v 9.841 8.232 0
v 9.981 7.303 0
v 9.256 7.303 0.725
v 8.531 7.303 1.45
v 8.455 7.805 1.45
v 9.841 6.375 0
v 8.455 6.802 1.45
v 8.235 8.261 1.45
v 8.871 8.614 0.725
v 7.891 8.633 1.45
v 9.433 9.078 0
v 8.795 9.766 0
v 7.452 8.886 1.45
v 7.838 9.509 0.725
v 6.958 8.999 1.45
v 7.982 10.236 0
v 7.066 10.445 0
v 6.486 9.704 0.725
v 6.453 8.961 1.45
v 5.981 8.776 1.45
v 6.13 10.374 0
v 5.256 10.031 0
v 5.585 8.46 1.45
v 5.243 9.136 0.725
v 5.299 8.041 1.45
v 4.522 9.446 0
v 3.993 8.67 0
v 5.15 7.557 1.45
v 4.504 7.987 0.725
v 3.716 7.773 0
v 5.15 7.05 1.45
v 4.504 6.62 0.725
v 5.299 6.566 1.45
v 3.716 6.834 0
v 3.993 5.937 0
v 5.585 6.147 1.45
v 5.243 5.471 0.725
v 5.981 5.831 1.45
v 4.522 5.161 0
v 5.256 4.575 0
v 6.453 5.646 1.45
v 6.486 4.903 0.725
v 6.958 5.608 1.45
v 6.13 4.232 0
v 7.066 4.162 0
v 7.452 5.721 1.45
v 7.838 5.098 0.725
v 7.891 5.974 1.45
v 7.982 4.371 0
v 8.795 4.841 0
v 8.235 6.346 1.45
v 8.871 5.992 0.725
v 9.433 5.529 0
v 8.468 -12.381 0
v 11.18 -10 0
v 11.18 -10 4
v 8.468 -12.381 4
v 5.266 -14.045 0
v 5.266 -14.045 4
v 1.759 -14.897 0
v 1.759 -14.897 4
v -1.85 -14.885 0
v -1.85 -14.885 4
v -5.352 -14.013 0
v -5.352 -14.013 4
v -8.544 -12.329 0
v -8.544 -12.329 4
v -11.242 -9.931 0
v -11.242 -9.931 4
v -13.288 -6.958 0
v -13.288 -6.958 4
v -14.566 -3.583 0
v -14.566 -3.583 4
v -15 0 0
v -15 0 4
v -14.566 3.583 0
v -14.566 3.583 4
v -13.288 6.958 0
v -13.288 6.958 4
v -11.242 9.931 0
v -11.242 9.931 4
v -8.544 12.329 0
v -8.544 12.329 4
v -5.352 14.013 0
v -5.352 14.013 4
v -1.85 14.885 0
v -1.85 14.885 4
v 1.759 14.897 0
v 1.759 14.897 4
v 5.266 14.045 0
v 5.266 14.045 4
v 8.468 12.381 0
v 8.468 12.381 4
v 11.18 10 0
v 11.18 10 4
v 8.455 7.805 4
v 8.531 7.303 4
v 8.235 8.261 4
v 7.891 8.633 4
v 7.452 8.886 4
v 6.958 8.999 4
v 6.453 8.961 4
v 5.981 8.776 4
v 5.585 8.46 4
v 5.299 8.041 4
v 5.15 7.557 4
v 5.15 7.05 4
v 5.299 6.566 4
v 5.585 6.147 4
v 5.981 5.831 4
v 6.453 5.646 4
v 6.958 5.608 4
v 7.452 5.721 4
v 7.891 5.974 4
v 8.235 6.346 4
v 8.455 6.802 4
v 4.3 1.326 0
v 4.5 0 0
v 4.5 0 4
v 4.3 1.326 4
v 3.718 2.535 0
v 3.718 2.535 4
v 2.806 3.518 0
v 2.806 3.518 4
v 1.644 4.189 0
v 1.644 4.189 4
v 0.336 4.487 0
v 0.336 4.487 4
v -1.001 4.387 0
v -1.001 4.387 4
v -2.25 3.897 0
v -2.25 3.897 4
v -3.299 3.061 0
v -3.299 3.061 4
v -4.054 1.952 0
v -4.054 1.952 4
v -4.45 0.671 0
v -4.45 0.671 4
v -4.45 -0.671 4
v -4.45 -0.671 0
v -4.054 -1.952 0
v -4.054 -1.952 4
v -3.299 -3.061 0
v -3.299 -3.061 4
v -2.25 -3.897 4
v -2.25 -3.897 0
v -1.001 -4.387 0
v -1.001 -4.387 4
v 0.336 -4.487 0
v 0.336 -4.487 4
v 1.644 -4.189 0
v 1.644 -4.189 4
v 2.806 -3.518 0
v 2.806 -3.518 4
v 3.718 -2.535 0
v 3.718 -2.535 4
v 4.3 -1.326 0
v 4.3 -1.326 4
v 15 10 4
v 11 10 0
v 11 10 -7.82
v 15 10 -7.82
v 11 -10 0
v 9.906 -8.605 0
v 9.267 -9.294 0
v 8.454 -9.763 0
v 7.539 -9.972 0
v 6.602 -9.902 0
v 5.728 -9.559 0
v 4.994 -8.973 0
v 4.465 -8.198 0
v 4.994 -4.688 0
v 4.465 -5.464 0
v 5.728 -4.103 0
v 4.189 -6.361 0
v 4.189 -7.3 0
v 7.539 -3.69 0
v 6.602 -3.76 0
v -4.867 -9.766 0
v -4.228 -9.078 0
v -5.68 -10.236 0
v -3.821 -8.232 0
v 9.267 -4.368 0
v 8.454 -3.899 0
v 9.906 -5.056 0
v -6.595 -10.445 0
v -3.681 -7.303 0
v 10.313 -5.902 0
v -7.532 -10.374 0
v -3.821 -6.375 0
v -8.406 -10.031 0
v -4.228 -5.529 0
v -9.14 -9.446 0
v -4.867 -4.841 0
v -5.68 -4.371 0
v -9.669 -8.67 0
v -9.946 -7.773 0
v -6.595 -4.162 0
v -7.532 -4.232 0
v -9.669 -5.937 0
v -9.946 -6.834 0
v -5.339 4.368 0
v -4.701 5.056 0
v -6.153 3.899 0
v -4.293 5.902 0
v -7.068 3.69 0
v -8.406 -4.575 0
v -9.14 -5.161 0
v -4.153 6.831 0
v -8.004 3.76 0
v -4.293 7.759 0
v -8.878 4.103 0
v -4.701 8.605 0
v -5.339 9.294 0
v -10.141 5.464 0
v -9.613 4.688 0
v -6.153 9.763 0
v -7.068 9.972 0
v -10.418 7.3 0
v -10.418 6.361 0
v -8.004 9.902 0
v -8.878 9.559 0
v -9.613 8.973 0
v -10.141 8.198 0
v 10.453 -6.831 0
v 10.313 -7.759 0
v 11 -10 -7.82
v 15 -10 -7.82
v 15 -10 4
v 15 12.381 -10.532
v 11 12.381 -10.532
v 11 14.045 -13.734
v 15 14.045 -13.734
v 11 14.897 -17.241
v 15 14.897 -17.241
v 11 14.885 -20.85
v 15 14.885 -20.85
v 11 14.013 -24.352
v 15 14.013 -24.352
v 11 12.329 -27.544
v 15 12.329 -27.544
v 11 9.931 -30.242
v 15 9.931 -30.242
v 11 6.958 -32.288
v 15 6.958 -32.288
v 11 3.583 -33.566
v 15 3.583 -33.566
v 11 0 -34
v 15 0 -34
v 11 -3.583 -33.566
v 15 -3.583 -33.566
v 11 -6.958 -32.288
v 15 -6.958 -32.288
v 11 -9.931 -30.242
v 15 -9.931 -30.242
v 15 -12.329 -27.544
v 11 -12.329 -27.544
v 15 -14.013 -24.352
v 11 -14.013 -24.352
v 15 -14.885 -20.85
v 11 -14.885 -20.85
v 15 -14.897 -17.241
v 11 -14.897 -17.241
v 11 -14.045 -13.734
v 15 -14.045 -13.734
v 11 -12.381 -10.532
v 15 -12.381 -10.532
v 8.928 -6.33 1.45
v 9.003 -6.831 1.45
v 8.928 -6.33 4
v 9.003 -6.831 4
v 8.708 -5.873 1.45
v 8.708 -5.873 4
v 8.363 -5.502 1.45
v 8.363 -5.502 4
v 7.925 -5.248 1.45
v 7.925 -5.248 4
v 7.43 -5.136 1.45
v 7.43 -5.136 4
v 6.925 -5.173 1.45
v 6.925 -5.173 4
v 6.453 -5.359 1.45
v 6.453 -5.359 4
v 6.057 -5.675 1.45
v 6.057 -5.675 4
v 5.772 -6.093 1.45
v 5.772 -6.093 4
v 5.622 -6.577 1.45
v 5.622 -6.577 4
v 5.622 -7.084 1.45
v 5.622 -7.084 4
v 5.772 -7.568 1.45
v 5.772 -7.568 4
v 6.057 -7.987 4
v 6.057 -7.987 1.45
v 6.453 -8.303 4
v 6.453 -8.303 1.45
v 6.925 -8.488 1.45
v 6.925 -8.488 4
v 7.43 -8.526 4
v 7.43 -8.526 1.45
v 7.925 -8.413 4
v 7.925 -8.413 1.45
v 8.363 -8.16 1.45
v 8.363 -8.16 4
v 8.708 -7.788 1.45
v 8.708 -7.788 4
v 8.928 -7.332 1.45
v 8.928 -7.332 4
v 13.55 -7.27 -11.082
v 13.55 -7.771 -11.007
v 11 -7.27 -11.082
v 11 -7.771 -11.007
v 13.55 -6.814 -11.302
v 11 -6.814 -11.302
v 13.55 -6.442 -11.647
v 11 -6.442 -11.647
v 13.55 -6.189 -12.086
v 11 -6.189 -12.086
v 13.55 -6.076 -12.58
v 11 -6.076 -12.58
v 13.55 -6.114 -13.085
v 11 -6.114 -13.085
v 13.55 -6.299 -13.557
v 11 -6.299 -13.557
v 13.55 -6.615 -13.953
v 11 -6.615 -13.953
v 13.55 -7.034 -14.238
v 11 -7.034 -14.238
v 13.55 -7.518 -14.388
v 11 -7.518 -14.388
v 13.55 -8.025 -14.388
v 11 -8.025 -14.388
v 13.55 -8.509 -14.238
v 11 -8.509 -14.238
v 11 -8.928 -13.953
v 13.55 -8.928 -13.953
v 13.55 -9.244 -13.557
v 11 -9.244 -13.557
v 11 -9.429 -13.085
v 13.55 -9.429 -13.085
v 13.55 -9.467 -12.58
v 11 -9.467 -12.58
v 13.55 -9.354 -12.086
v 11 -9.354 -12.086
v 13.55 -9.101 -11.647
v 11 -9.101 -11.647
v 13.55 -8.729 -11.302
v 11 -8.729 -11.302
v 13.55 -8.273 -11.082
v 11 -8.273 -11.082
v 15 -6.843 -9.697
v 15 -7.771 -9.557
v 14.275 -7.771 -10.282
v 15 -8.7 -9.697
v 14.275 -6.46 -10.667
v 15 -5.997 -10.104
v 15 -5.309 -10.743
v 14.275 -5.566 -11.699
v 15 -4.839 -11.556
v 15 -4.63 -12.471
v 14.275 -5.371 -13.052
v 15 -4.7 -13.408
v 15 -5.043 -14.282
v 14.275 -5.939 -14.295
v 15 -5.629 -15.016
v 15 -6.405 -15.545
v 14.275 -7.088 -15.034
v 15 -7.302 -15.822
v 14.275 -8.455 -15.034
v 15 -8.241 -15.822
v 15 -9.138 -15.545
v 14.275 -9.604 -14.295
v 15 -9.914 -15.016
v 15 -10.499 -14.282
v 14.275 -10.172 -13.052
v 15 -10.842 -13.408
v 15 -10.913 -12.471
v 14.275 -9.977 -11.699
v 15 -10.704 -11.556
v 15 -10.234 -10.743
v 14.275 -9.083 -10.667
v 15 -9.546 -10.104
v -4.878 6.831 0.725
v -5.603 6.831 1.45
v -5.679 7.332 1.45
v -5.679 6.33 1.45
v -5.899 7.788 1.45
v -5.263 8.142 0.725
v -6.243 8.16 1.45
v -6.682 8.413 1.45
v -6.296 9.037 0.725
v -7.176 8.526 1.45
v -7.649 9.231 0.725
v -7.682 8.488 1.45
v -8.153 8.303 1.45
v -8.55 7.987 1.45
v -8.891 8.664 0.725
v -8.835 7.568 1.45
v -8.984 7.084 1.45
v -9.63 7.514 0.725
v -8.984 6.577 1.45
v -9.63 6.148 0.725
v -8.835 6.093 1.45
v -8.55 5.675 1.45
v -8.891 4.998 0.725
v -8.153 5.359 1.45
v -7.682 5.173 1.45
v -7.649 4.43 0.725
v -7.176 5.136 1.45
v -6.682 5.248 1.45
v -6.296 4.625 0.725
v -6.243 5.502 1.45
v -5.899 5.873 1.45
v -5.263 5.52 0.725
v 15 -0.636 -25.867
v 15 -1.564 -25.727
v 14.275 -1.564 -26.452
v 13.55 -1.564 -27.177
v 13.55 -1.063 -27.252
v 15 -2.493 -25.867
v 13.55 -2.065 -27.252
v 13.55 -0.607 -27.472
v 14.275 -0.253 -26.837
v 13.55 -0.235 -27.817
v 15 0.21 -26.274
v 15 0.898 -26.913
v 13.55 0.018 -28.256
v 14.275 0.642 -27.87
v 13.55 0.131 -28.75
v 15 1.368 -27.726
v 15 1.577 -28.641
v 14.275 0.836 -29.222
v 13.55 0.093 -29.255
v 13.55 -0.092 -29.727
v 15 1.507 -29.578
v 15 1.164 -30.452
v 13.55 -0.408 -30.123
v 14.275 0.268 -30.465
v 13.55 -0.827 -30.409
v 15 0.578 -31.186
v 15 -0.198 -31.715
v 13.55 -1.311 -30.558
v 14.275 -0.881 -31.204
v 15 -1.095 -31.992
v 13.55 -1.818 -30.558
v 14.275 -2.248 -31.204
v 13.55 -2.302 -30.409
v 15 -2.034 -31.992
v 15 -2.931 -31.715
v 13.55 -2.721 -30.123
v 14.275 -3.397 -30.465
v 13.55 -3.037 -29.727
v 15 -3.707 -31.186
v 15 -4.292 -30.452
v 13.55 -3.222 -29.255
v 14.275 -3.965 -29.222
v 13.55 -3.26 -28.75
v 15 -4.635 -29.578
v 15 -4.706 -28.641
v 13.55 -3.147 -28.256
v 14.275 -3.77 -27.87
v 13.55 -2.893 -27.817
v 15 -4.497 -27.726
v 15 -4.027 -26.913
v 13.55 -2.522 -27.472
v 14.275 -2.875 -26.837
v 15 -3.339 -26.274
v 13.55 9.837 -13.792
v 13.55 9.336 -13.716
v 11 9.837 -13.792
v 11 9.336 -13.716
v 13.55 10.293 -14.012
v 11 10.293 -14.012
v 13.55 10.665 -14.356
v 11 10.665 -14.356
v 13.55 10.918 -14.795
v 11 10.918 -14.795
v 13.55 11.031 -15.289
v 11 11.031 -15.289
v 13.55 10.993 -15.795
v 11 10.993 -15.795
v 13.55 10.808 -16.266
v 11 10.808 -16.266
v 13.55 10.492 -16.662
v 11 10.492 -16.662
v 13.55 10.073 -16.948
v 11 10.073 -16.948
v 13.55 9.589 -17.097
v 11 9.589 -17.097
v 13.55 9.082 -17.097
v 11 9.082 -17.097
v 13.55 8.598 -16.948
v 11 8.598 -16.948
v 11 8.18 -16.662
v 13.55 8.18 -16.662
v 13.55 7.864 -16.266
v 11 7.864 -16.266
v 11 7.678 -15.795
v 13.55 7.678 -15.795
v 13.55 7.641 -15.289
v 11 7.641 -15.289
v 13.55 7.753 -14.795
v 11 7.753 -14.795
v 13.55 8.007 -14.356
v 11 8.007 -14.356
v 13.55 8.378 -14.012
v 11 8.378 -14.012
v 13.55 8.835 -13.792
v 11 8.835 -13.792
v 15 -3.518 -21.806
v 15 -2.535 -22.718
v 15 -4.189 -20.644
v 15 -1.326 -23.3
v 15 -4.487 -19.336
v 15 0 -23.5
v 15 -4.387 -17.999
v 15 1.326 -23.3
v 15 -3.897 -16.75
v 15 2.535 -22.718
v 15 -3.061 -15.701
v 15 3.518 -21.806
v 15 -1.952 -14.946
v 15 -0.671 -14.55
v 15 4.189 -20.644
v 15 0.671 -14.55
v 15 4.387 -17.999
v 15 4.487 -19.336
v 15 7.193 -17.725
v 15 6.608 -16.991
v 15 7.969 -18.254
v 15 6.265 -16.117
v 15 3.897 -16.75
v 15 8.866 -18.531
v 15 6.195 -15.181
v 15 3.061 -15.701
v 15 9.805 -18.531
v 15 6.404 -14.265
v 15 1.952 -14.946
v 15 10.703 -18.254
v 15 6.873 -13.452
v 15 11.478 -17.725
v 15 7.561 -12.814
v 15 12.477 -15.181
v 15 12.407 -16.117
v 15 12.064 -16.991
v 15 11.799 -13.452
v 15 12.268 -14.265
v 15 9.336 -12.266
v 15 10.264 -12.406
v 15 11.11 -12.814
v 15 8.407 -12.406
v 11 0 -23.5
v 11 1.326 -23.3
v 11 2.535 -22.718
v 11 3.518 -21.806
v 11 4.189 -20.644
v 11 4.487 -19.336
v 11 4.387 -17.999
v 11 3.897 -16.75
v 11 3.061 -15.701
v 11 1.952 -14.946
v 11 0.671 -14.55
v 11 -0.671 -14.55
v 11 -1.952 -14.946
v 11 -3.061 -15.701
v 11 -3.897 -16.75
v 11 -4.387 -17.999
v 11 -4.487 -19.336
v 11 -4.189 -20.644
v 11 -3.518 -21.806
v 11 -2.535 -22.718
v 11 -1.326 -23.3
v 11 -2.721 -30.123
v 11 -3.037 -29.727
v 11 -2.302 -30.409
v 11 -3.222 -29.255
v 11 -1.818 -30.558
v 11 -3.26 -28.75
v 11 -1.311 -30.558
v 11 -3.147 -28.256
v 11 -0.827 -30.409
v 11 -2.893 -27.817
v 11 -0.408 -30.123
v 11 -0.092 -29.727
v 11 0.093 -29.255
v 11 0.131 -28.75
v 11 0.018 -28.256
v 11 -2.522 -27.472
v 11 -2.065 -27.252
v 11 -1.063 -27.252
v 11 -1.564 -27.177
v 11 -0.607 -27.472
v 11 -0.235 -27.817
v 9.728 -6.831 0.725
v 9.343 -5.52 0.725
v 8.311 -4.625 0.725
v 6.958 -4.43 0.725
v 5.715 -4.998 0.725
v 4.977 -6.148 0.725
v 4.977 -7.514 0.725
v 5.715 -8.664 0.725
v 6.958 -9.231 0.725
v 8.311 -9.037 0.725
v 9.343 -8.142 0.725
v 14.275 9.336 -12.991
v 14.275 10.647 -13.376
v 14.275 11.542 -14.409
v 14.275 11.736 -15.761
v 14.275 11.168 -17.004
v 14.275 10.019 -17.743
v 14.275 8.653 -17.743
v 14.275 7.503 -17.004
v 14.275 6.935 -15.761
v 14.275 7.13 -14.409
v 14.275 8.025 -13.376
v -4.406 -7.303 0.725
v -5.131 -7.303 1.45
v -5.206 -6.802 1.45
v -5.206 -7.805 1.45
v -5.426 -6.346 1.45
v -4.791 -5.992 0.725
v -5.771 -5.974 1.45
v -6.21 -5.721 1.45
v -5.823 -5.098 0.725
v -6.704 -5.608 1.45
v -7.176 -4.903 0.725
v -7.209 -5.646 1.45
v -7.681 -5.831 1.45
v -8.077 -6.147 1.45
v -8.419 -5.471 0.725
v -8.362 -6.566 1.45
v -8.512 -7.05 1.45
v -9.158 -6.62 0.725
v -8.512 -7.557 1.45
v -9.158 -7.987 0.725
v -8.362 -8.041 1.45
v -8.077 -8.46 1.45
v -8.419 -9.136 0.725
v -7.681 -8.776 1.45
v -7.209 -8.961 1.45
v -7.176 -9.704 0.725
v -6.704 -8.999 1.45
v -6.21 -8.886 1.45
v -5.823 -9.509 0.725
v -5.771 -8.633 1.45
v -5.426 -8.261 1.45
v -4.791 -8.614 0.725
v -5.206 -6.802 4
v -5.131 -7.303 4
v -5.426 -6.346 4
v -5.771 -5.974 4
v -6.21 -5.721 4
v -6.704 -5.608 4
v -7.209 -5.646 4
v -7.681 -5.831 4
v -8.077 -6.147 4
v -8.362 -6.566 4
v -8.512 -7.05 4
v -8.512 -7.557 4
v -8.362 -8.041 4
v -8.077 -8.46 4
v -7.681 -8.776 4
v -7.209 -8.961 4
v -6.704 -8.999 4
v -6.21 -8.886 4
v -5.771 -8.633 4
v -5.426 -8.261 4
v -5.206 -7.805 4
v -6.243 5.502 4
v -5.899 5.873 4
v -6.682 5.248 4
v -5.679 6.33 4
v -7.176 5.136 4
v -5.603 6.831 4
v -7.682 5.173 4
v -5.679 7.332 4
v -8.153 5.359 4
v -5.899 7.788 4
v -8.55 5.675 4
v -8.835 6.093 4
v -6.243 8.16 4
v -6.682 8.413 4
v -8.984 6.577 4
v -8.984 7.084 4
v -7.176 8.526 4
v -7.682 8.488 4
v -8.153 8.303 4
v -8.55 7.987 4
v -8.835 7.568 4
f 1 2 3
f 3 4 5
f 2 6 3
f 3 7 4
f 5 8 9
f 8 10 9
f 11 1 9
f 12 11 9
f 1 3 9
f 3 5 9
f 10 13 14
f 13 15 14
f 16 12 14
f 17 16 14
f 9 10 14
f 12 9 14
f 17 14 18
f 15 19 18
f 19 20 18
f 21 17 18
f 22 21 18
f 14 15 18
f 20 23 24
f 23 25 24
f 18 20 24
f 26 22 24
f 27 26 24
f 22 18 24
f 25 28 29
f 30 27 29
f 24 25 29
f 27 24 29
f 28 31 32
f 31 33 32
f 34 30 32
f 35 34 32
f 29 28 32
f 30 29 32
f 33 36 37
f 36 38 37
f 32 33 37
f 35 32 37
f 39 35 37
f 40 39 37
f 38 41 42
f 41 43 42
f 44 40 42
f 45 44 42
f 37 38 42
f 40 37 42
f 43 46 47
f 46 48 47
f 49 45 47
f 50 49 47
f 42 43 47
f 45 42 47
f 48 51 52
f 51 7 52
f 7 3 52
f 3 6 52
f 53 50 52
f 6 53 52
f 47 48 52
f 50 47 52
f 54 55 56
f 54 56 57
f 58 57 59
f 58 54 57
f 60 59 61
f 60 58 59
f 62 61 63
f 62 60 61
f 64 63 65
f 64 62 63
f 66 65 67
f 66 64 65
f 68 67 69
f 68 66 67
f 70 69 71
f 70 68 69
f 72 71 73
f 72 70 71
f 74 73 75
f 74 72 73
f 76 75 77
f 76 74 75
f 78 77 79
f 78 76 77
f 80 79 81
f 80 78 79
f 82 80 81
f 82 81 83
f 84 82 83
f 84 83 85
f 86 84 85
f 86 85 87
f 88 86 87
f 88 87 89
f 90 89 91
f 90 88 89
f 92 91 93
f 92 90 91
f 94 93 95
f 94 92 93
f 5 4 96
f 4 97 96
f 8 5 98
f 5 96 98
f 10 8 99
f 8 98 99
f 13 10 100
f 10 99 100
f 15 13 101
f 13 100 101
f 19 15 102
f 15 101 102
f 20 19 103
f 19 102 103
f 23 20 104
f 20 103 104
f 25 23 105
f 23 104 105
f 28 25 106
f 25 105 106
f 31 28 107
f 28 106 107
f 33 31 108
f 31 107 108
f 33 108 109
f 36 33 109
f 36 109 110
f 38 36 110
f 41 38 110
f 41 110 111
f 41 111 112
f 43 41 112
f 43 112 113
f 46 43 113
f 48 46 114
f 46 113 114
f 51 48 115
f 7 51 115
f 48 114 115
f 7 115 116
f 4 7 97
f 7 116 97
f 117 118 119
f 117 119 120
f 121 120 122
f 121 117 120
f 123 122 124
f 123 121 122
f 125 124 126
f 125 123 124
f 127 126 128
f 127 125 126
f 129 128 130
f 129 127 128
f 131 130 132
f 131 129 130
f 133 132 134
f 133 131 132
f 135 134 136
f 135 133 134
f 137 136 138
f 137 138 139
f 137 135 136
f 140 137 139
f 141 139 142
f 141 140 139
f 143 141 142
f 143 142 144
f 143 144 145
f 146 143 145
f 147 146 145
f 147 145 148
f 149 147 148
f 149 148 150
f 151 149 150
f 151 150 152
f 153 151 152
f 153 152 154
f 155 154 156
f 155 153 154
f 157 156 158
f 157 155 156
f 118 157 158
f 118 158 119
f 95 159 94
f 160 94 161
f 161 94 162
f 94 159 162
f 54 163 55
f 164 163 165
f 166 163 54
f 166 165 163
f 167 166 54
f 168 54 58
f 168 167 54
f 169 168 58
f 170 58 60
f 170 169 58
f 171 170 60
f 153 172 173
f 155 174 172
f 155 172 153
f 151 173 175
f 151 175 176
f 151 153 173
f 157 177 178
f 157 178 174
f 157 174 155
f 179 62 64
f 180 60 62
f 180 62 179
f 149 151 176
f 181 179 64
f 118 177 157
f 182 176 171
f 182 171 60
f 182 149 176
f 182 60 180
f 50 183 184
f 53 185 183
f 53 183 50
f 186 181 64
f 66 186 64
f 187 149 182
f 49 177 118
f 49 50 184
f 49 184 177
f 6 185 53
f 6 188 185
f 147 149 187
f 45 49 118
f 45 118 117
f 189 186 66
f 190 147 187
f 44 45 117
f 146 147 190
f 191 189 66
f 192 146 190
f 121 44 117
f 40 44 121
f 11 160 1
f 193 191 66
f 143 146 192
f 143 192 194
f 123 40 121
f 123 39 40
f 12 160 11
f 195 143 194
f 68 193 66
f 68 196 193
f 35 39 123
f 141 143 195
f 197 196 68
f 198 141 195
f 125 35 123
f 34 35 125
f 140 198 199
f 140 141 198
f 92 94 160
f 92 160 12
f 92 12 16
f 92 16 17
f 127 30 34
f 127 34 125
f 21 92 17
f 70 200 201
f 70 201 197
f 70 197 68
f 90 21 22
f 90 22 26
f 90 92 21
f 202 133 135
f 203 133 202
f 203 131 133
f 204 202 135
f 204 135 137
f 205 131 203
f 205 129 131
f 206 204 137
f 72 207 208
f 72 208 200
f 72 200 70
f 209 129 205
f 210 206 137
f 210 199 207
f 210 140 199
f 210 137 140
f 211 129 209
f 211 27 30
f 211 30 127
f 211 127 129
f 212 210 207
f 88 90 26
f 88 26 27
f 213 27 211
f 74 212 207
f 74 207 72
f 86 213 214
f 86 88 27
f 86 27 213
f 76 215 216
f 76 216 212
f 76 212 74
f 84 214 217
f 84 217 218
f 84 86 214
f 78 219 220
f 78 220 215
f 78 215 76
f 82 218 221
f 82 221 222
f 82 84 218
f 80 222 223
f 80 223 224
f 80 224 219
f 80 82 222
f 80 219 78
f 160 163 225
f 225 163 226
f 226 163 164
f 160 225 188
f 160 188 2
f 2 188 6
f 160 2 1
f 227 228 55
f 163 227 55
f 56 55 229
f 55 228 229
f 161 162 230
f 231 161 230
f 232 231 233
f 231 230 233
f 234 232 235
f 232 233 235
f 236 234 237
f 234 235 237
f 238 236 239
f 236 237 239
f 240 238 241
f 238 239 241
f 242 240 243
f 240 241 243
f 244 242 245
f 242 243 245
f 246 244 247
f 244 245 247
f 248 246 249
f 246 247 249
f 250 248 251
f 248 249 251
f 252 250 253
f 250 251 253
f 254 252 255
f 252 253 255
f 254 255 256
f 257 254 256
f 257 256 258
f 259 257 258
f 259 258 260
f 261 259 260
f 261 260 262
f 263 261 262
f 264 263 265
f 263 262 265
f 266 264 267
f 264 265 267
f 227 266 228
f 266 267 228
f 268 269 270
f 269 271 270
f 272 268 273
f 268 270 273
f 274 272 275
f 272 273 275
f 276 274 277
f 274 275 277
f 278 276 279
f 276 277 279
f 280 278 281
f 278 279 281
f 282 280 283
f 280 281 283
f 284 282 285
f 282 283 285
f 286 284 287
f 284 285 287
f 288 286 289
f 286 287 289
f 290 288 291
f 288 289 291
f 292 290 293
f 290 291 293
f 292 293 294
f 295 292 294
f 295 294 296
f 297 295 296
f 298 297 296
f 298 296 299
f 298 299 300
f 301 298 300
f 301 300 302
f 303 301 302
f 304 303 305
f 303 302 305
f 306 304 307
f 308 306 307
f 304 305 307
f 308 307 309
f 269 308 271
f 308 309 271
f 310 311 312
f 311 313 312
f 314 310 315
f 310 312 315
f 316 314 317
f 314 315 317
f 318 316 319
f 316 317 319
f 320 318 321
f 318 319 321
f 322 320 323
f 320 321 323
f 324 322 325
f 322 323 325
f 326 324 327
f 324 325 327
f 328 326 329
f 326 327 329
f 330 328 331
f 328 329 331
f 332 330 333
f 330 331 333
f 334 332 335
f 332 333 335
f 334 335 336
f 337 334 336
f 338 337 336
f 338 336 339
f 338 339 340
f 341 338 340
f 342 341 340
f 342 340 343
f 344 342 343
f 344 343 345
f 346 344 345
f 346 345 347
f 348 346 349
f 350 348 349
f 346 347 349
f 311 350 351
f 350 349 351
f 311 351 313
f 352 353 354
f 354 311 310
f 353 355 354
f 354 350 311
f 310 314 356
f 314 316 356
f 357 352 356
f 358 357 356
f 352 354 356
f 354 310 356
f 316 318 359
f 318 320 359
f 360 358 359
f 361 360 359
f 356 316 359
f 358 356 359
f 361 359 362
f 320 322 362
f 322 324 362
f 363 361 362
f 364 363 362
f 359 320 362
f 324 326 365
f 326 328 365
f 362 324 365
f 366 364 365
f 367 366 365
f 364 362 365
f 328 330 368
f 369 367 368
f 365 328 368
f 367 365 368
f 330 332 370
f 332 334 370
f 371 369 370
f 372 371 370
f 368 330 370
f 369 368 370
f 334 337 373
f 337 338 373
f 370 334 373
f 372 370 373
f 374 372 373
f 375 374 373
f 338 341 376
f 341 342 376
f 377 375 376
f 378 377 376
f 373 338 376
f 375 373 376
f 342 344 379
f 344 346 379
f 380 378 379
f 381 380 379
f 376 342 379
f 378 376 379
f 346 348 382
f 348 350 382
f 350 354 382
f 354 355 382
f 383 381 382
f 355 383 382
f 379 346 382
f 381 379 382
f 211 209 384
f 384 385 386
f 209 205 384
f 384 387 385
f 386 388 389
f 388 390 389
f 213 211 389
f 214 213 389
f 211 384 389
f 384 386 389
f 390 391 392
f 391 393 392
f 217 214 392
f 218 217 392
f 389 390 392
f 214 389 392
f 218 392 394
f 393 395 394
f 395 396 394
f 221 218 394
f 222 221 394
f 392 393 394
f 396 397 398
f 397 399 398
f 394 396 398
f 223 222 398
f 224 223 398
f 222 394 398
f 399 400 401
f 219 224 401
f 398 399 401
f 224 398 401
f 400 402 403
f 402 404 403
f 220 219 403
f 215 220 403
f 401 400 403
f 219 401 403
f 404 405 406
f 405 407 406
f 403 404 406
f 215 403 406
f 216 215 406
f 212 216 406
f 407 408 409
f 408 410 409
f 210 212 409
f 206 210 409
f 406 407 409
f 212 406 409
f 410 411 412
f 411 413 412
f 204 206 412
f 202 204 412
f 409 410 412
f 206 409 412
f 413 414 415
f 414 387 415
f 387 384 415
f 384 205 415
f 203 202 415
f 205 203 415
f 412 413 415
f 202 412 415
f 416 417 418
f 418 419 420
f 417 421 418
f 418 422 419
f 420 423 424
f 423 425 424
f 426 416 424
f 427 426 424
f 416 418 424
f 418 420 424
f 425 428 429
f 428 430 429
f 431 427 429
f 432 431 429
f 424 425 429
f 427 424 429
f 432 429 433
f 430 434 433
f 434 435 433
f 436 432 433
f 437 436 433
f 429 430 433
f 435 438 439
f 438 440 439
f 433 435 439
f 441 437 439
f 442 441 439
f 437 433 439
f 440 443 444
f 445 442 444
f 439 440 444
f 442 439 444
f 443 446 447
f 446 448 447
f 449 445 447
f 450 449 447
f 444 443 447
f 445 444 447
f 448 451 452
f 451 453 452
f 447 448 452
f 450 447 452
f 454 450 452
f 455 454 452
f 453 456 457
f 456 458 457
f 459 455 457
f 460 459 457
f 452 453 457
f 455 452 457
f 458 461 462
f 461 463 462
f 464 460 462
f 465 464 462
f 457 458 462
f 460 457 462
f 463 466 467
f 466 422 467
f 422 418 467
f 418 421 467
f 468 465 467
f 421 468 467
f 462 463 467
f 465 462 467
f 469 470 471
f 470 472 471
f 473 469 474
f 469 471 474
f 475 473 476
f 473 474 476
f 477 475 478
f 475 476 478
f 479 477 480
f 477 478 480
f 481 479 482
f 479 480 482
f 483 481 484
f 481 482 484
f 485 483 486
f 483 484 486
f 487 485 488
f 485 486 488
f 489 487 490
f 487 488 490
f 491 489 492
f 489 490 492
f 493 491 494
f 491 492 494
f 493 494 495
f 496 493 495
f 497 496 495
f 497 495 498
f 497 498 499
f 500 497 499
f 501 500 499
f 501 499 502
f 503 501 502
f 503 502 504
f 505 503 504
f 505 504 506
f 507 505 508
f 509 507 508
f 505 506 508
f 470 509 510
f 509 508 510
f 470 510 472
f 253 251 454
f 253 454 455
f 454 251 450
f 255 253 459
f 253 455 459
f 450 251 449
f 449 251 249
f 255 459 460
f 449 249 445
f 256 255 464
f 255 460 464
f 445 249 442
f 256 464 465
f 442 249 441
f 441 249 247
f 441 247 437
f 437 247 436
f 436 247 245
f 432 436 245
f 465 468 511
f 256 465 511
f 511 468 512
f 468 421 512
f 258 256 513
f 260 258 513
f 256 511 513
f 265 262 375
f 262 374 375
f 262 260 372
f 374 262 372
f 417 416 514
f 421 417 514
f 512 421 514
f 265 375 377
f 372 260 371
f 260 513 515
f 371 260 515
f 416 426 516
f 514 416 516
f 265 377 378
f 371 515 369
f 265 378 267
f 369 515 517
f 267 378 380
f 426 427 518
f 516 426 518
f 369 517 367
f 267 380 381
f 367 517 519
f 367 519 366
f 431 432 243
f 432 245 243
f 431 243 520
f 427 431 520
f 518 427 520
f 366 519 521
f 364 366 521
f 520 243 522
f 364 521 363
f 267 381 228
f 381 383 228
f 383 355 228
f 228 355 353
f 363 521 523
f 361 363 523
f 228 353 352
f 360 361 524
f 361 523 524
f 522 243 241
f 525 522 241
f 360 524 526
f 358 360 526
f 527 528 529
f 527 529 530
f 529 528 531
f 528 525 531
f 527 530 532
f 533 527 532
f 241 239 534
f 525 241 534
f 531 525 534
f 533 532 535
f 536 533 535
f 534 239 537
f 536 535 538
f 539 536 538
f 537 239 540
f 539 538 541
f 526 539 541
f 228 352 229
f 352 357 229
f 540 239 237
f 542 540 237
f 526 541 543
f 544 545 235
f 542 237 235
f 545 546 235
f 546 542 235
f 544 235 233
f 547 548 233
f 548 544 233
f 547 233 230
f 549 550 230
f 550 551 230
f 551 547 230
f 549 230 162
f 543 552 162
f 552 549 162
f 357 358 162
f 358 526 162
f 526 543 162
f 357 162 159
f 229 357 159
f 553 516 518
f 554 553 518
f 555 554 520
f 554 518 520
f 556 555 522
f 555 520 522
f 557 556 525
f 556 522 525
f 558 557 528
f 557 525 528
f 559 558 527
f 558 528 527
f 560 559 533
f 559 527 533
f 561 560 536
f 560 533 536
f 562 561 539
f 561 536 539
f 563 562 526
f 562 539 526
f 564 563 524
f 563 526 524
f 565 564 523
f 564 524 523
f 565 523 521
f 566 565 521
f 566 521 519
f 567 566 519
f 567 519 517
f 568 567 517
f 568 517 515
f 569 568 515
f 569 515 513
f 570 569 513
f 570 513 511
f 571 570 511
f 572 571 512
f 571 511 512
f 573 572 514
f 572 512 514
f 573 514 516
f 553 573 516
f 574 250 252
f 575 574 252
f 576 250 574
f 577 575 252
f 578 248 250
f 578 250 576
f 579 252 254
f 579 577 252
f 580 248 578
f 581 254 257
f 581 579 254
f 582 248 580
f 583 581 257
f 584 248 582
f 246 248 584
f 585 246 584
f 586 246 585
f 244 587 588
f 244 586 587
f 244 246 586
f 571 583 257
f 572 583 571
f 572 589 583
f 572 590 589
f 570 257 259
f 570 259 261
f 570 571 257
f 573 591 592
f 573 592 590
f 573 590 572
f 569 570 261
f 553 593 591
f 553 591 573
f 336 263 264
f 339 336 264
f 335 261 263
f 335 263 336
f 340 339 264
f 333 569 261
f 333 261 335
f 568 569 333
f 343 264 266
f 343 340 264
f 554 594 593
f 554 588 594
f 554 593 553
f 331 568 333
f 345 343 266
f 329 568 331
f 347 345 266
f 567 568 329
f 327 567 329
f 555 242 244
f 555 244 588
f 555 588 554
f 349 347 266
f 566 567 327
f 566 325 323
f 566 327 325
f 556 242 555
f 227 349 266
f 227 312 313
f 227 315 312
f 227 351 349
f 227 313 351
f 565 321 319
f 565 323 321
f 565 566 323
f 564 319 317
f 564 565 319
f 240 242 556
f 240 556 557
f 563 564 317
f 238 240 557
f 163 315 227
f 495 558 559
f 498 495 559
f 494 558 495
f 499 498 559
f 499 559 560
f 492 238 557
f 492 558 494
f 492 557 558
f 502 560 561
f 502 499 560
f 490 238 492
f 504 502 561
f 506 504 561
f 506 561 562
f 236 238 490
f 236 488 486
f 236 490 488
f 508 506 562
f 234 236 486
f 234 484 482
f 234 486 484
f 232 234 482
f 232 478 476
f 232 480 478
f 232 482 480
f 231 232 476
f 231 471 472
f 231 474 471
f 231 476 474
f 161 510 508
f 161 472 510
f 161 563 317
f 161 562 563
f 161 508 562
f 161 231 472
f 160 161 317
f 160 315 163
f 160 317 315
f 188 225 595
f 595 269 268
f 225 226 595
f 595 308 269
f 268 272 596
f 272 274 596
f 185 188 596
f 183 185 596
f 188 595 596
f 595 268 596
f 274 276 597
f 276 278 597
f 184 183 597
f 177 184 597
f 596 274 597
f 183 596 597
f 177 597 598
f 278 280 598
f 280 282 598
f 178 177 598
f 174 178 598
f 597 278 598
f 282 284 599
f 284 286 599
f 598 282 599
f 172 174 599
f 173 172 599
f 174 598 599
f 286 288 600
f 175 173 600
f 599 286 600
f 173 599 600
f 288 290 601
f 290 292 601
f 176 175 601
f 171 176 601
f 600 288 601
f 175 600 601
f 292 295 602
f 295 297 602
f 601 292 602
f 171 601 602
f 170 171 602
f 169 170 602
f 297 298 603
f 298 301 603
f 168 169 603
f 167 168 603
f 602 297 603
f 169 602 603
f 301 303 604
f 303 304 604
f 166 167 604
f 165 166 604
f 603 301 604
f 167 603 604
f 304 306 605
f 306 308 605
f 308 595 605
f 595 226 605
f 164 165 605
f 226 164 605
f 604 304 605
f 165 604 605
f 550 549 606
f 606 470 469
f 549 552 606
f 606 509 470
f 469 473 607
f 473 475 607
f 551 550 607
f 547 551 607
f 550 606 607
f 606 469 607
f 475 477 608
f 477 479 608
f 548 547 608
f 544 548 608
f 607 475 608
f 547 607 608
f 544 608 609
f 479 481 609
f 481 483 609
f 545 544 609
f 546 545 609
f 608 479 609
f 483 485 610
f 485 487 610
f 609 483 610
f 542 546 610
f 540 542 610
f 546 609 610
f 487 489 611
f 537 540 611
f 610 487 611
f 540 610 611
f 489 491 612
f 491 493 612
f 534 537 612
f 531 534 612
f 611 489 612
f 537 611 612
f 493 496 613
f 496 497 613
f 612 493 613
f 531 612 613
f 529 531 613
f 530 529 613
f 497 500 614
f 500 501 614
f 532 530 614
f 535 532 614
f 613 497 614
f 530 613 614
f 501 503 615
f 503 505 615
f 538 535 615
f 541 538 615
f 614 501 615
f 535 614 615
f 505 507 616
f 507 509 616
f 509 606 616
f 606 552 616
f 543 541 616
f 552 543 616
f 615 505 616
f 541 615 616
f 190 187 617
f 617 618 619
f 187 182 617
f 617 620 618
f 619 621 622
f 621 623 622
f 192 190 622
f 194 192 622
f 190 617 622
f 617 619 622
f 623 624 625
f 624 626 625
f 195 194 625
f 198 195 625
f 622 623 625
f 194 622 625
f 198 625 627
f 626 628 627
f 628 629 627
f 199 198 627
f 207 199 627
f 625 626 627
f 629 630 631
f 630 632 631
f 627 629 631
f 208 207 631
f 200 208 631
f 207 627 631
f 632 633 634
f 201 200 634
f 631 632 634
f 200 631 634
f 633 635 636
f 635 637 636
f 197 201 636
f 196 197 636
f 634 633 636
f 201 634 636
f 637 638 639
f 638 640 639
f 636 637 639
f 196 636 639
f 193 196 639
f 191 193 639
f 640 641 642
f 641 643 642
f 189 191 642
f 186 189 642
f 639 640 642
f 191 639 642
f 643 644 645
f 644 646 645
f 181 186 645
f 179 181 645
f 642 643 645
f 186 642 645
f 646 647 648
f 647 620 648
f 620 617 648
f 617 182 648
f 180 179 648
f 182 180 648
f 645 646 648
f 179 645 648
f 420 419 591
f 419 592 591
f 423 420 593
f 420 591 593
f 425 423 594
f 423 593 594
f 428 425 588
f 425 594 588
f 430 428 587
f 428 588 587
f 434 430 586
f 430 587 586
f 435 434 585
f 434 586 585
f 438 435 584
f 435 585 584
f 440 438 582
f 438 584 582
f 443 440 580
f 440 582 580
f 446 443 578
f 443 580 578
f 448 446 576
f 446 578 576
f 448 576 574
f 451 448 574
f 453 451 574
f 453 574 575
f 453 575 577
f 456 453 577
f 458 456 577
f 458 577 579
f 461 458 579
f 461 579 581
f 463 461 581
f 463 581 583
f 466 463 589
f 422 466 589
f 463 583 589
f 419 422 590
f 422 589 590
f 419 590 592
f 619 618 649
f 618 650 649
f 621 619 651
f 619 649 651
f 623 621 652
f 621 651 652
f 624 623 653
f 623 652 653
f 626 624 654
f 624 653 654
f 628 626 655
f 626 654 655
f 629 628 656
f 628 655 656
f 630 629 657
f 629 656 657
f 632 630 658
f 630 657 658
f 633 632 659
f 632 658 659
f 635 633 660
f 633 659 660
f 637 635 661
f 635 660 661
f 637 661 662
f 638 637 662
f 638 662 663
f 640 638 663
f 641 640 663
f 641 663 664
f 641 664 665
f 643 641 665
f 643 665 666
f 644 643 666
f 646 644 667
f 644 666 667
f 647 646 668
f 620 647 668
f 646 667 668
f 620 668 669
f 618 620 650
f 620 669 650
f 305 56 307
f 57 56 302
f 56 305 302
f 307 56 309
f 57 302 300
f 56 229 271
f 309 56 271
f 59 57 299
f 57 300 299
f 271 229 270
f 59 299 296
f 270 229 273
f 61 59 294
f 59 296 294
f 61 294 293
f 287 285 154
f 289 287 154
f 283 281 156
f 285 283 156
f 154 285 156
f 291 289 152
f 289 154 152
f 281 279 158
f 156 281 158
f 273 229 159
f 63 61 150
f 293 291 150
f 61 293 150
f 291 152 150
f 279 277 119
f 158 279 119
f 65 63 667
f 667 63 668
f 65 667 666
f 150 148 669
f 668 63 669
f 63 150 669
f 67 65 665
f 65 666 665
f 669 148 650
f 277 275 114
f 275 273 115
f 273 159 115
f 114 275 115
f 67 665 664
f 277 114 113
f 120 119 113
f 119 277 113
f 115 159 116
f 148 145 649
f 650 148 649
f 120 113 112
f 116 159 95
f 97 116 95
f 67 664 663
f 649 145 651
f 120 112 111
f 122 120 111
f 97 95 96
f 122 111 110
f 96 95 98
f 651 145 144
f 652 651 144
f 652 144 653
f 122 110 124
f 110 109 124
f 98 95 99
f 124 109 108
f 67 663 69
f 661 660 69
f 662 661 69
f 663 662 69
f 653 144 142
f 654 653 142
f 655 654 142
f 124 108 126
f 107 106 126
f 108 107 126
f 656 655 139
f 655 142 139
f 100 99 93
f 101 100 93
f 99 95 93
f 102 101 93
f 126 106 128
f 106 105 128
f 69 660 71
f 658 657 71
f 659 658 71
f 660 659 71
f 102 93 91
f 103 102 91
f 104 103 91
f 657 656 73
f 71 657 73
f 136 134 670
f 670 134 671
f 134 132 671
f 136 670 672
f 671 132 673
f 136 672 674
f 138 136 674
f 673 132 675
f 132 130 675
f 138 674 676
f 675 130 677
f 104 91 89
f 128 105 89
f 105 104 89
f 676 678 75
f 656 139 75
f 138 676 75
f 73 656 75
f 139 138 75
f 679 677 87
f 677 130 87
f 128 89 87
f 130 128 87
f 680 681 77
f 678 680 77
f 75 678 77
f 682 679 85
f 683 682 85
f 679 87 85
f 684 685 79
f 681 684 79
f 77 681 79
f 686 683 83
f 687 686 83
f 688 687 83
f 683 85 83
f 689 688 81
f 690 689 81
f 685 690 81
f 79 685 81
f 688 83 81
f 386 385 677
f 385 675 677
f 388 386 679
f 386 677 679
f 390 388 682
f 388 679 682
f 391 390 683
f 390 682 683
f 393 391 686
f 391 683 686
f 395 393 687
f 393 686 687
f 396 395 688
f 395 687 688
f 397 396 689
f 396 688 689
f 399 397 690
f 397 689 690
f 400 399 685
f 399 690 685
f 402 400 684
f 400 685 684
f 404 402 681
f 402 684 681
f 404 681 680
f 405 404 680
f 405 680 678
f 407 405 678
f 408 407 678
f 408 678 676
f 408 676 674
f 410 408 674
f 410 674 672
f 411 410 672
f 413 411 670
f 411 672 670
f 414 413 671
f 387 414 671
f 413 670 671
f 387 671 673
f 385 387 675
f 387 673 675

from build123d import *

# Parameters (mm, degrees)
ESQUISSE1_R                                    = 4.5
ESQUISSE1_R_2                                  = 1.5
BOSS_EXTRU_1_DEPTH                             = 4
ESQUISSE3_R                                    = 4.5
ESQUISSE3_R_2                                  = 1.500083245
BOSS_EXTRU_2_DEPTH                             = 4
FRAISAGE_POUR_VIS_T_TE_FRAIS_E_M31_D           = 3.4
FRAISAGE_POUR_VIS_T_TE_FRAIS_E_M31_CSINK_D     = 6.3
FRAISAGE_POUR_VIS_T_TE_FRAIS_E_M31_CSINK_ANGLE = 90
FRAISAGE_POUR_VIS_T_TE_FRAIS_E_M32_D           = 3.4
FRAISAGE_POUR_VIS_T_TE_FRAIS_E_M32_CSINK_D     = 6.3
FRAISAGE_POUR_VIS_T_TE_FRAIS_E_M32_CSINK_ANGLE = 90


with BuildPart() as part:
    # Esquisse1 → Boss.-Extru.1 (new body)
    with BuildSketch(Plane.XY):
        with BuildLine():
            Line((11.180339887, 10), (15, 10))
            Line((15, 10), (15, -10))
            Line((15, -10), (11.180339887, -10))
            ThreePointArc((11.180339887, -10), (-15, 0), (11.180339887, 10))
        make_face()
        Circle(ESQUISSE1_R, mode=Mode.SUBTRACT)
        with Locations((-7.303420571, 6.830816054)):
            Circle(ESQUISSE1_R_2, mode=Mode.SUBTRACT)
        with Locations((6.830816054, 7.303420571)):
            Circle(ESQUISSE1_R_2, mode=Mode.SUBTRACT)
        with Locations((7.303420571, -6.830816054)):
            Circle(ESQUISSE1_R_2, mode=Mode.SUBTRACT)
        with Locations((-6.830816054, -7.303420571)):
            Circle(ESQUISSE1_R_2, mode=Mode.SUBTRACT)
    extrude(amount=BOSS_EXTRU_1_DEPTH)

    # Esquisse3 → Boss.-Extru.2 (add)
    with BuildSketch(Plane(origin=(15, 0, 0), x_dir=(0, 0, -1), z_dir=(1, 0, 0))):
        with BuildLine():
            Line((0, 10), (7.819660113, 10))
            ThreePointArc((7.819660113, 10), (34, 0), (7.819660113, -10))
            Line((7.819660113, -10), (0, -10))
            Line((0, -10), (0, 10))
        make_face()
        with Locations((19, 0)):
            Circle(ESQUISSE3_R, mode=Mode.SUBTRACT)
        with Locations((15.416309522, 9.335800049)):
            Circle(ESQUISSE3_R_2, mode=Mode.SUBTRACT)
        with Locations((28.876885246, -1.564333031)):
            Circle(ESQUISSE3_R_2, mode=Mode.SUBTRACT)
        with Locations((12.706805232, -7.771467018)):
            Circle(ESQUISSE3_R_2, mode=Mode.SUBTRACT)
    extrude(amount=-BOSS_EXTRU_2_DEPTH)

    # Fraisage pour vis à tête fraisée M31 (through all)
    with Locations(Plane(origin=(0, 0, 0), x_dir=(-1, 0, 0), z_dir=(0, 0, -1))):
        with Locations((-6.830816054, 7.303420571), (7.303420571, 6.830816054), (6.830816054, -7.303420571), (-7.303420571, -6.830816054)):
            CounterSinkHole(FRAISAGE_POUR_VIS_T_TE_FRAIS_E_M31_D / 2, FRAISAGE_POUR_VIS_T_TE_FRAIS_E_M31_CSINK_D / 2, counter_sink_angle=FRAISAGE_POUR_VIS_T_TE_FRAIS_E_M31_CSINK_ANGLE)

    # Fraisage pour vis à tête fraisée M32 (through all)
    with Locations(Plane(origin=(15, 0, 0), x_dir=(0, 0, -1), z_dir=(1, 0, 0))):
        with Locations((15.416309522, 9.335800049), (28.876885246, -1.564333031), (12.706805232, -7.771467018)):
            CounterSinkHole(FRAISAGE_POUR_VIS_T_TE_FRAIS_E_M32_D / 2, FRAISAGE_POUR_VIS_T_TE_FRAIS_E_M32_CSINK_D / 2, counter_sink_angle=FRAISAGE_POUR_VIS_T_TE_FRAIS_E_M32_CSINK_ANGLE)


solid = part.part
